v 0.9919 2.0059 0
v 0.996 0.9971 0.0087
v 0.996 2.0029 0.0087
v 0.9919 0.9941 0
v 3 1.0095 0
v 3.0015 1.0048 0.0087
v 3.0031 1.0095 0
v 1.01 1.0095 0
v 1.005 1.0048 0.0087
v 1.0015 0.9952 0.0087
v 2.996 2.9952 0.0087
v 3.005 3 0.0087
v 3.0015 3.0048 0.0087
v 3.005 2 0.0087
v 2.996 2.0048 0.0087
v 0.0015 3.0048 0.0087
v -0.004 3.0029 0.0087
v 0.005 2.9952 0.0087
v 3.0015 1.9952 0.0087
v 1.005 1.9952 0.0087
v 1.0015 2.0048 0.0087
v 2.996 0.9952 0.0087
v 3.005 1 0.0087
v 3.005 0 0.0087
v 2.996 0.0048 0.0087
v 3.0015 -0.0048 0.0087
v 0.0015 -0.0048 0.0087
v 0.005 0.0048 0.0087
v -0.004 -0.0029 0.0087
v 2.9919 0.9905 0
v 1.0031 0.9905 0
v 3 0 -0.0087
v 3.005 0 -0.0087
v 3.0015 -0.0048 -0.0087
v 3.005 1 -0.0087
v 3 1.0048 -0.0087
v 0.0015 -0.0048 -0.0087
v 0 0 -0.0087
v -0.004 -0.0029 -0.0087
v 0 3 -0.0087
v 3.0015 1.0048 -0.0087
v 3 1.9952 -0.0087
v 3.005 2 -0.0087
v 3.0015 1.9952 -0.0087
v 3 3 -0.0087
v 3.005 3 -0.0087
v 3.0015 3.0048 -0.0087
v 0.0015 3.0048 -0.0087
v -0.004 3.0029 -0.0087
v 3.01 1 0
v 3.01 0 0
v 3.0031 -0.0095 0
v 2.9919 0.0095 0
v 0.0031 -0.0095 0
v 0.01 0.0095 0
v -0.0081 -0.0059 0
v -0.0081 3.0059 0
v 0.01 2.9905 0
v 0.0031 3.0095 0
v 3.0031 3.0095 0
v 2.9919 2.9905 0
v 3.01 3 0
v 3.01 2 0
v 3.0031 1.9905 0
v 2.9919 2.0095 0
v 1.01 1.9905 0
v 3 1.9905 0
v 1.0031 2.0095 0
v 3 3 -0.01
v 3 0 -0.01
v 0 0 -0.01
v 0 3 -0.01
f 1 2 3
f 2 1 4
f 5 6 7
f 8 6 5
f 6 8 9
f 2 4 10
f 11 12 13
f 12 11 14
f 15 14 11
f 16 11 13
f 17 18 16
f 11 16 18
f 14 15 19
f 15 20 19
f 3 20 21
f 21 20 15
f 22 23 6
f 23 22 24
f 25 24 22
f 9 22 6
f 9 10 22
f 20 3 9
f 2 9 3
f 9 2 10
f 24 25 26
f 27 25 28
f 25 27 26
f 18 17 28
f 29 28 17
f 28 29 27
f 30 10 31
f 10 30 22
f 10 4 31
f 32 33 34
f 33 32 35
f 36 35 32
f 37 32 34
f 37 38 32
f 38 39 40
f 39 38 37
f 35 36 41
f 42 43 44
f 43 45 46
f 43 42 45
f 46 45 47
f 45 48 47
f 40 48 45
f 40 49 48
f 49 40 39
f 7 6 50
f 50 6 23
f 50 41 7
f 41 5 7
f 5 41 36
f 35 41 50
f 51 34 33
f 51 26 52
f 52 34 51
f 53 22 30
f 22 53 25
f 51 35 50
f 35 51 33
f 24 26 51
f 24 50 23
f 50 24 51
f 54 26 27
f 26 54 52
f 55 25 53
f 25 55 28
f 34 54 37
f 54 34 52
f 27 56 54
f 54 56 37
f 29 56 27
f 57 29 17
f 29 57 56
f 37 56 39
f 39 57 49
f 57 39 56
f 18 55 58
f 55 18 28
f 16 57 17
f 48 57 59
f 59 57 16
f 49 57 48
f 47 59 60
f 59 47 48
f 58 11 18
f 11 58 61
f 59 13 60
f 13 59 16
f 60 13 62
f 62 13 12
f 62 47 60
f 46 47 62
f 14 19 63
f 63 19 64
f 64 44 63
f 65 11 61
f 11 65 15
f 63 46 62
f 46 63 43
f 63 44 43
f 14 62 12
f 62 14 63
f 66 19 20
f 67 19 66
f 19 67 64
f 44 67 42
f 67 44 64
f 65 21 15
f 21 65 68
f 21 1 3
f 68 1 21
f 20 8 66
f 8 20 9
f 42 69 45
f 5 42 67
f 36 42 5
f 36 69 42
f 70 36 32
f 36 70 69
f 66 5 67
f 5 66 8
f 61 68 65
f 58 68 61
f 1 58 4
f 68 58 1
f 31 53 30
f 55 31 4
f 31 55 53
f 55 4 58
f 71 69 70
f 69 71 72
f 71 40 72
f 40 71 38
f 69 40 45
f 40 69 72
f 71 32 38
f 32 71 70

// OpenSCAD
hull(){
    translate([1, 1]) sphere(0.01);
    translate([2, 1]) sphere(0.01);
}
hull(){
    translate([2, 1]) sphere(0.01);
    translate([3, 1]) sphere(0.01);
}
hull(){
    translate([3, 1]) sphere(0.01);
    translate([3, 0]) sphere(0.01);
}
hull(){
    translate([3, 0]) sphere(0.01);
    translate([2, 0]) sphere(0.01);
}
hull(){
    translate([2, 0]) sphere(0.01);
    translate([1, 0]) sphere(0.01);
}
hull(){
    translate([1, 0]) sphere(0.01);
    translate([0, 0]) sphere(0.01);
}
hull(){
    translate([0, 0]) sphere(0.01);
    translate([0, 1]) sphere(0.01);
}
hull(){
    translate([0, 1]) sphere(0.01);
    translate([0, 2]) sphere(0.01);
}
hull(){
    translate([0, 2]) sphere(0.01);
    translate([0, 3]) sphere(0.01);
}
hull(){
    translate([0, 3]) sphere(0.01);
    translate([1, 3]) sphere(0.01);
}
hull(){
    translate([1, 3]) sphere(0.01);
    translate([2, 3]) sphere(0.01);
}
hull(){
    translate([2, 3]) sphere(0.01);
    translate([3, 3]) sphere(0.01);
}
hull(){
    translate([3, 3]) sphere(0.01);
    translate([3, 2]) sphere(0.01);
}
hull(){
    translate([3, 2]) sphere(0.01);
    translate([2, 2]) sphere(0.01);
}
hull(){
    translate([2, 2]) sphere(0.01);
    translate([1, 2]) sphere(0.01);
}
hull(){
    translate([1, 2]) sphere(0.01);
    translate([1, 1]) sphere(0.01);
}
translate([0,0,-0.01]) color([0.1,0.1,0.1]) cube([3,3,0.01]);
